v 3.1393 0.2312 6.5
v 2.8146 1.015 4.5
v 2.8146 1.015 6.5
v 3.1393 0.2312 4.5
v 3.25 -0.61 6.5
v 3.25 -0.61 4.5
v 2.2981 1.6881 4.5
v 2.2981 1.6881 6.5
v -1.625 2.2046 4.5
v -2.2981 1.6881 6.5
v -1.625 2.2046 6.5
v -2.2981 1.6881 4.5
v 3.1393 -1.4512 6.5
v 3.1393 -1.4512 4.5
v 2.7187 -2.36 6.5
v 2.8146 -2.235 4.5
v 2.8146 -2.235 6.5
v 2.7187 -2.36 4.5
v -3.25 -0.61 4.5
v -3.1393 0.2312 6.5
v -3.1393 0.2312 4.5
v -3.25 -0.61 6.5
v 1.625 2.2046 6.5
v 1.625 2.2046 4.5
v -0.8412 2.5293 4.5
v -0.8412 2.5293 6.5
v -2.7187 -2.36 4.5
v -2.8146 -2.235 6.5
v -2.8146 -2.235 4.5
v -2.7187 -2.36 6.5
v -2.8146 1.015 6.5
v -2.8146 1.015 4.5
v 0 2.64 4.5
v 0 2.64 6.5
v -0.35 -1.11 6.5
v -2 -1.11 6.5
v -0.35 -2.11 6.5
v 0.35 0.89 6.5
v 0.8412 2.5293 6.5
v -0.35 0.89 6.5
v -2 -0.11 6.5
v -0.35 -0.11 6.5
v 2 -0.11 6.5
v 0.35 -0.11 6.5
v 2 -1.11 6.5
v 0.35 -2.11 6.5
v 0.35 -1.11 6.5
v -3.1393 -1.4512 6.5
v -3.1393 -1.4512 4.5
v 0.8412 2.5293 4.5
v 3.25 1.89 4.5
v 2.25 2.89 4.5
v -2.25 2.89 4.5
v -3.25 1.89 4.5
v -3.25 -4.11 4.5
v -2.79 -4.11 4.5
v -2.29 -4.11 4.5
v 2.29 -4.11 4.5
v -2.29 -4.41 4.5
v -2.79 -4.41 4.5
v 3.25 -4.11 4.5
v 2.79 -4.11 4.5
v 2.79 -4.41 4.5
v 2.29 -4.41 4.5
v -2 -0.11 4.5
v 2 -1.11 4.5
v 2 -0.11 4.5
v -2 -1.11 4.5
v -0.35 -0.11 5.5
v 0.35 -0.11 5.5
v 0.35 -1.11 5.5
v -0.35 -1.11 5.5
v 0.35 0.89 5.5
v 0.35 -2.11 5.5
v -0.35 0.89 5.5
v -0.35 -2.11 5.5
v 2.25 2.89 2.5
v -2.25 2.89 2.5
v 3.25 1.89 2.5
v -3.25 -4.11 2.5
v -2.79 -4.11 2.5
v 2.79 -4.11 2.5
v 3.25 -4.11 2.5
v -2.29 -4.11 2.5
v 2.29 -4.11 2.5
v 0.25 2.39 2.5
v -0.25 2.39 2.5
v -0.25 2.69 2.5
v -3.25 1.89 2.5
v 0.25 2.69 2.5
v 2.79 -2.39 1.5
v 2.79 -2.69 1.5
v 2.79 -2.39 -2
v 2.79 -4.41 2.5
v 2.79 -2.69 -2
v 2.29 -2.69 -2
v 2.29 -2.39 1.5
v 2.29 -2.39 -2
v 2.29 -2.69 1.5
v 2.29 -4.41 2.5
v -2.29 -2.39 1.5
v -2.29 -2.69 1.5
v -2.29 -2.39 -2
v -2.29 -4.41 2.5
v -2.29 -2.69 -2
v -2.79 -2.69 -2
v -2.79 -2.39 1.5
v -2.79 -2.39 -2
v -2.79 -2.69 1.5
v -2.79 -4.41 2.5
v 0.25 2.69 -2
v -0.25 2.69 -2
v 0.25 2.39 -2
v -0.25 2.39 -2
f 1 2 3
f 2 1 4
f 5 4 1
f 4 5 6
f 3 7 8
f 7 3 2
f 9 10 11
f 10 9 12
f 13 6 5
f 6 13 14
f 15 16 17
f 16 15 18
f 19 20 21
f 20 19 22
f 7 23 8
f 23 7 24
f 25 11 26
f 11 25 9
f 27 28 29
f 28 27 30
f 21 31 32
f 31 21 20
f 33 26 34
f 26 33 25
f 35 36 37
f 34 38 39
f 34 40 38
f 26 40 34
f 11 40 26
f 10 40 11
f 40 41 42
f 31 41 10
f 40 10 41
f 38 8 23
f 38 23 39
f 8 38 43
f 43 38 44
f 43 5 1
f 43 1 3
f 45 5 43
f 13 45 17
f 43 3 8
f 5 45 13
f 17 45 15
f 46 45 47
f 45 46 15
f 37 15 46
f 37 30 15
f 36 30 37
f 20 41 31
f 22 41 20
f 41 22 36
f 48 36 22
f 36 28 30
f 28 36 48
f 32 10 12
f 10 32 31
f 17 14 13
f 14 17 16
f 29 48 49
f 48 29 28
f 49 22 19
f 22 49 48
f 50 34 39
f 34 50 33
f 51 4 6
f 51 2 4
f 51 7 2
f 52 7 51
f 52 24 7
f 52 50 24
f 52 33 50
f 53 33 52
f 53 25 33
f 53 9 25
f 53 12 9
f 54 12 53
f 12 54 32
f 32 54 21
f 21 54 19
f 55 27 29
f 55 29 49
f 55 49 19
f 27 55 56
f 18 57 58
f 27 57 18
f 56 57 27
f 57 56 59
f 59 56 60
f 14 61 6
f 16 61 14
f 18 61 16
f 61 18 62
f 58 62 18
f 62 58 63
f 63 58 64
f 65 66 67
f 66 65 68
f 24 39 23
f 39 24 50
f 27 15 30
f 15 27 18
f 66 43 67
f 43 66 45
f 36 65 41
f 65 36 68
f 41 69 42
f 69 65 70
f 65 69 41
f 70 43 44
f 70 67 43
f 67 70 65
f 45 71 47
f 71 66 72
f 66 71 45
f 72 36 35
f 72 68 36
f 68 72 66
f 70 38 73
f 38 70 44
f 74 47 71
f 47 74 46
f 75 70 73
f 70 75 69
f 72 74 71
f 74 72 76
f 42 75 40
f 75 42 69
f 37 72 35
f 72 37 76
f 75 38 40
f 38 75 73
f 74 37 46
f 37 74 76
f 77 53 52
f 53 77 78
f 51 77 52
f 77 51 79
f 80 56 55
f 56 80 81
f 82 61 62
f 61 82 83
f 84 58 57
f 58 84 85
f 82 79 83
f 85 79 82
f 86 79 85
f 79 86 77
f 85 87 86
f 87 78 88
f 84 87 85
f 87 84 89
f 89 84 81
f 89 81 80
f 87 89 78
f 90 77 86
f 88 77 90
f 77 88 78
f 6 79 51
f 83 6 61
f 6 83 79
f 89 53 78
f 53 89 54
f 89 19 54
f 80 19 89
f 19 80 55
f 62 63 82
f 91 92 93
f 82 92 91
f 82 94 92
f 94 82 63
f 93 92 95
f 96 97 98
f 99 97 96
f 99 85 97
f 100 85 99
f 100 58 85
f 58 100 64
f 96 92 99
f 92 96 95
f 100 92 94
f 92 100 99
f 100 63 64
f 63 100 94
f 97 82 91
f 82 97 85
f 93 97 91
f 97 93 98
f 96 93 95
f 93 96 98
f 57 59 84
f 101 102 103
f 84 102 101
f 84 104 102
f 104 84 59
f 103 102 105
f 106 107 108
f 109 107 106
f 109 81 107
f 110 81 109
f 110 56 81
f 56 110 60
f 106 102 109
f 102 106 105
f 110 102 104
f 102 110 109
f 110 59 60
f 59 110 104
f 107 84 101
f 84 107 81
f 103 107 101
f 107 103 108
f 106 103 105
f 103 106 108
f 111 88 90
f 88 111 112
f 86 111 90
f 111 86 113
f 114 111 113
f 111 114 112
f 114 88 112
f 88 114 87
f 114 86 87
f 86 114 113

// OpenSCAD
blue_w  = 6.5; // x size
blue_h  = 7;   // y size
blue_d  = 2;   // z size
blue_dx = 1;   // angle cut x size
blue_dy = 1;   // angle cut y size

mobile_d = 2;  // mobile part z size
    
pin_w = 0.3;
rear_pin_offset = 0.5;

delta = (pin_w + blue_h - 5.08 - rear_pin_offset);
tr = 2.54 - (blue_h / 2 - delta + pin_w/2);
translate([0, -tr, 2.5])
{
translate([0, 0, blue_d/2])
    body_part(blue_w, blue_h, blue_d, blue_dx, blue_dy, "blue");
translate([0, 0, blue_d + mobile_d/2])
    mobile_part();

translate([2.54, -(blue_h+pin_w)/2, blue_d])
rotate([0, 0, -90])
pin3(pin_w, -delta, 2, 1, 3.5, 0.5);

translate([-2.54, -(blue_h+pin_w)/2, blue_d])
rotate([0, 0, -90])
pin3(pin_w, -delta, 2, 1, 3.5, 0.5);

translate([0, (blue_h+pin_w)/2 - rear_pin_offset , blue_d])
rotate([0, 0, -90])
pin3(pin_w, 0, 2, 1, 3.5, 0.5);
}

module pin3(w, dx, h1, h2, h3, d)
{
    pin_points = [ 
               [0, 0],
               [h1, 0],
               [h1+h2, dx],
               [h1+h2+h3, dx],
               [h1+h2+h3, dx+w],
               [h1+h2, dx+w],
               [h1, w],
               [0, w] ];
    
    rotate([90, 90, 0]) translate([0, -w/2, -d/2]) linear_extrude(d) polygon(pin_points);
}

module body_part(w, h, d, w_angle, h_angle, c)
{
    translate([-w/2, -h/2, -d/2])
    {
        color(c)
            linear_extrude(d)
                polygon(points=[[0, 0],
                                [0, h - h_angle],
                                [w_angle, h],
                                [w-w_angle, h],
                                [w, h-h_angle],
                                [w, 0]]);
    }
    //cube([5, 8, 2]);
}

module mobile_part()
{
    h = 2;
    r = 3.25;
    y_cut = 5;
    
    hole1_w = 4;
    hole1_h = 1;
    hole1_d = h;
    
    hole2_w = 0.7;
    hole2_h = 3;
    hole2_d = h/2;

    //translate([0, 0, h/2]) cube([hole_w, hole_h, h], true);

    difference() {
        cylinder(h, r, r, $fn=24, center = true);    
        translate([-r, -r - y_cut, -h/2]) cube([r*2, r*2, h]);
        translate([0, 0, (h - hole1_d)/2]) cube([hole1_w, hole1_h, hole1_d], true);
        translate([0, 0, (h - hole2_d)/2]) cube([hole2_w, hole2_h, hole2_d], true);
    }
}
